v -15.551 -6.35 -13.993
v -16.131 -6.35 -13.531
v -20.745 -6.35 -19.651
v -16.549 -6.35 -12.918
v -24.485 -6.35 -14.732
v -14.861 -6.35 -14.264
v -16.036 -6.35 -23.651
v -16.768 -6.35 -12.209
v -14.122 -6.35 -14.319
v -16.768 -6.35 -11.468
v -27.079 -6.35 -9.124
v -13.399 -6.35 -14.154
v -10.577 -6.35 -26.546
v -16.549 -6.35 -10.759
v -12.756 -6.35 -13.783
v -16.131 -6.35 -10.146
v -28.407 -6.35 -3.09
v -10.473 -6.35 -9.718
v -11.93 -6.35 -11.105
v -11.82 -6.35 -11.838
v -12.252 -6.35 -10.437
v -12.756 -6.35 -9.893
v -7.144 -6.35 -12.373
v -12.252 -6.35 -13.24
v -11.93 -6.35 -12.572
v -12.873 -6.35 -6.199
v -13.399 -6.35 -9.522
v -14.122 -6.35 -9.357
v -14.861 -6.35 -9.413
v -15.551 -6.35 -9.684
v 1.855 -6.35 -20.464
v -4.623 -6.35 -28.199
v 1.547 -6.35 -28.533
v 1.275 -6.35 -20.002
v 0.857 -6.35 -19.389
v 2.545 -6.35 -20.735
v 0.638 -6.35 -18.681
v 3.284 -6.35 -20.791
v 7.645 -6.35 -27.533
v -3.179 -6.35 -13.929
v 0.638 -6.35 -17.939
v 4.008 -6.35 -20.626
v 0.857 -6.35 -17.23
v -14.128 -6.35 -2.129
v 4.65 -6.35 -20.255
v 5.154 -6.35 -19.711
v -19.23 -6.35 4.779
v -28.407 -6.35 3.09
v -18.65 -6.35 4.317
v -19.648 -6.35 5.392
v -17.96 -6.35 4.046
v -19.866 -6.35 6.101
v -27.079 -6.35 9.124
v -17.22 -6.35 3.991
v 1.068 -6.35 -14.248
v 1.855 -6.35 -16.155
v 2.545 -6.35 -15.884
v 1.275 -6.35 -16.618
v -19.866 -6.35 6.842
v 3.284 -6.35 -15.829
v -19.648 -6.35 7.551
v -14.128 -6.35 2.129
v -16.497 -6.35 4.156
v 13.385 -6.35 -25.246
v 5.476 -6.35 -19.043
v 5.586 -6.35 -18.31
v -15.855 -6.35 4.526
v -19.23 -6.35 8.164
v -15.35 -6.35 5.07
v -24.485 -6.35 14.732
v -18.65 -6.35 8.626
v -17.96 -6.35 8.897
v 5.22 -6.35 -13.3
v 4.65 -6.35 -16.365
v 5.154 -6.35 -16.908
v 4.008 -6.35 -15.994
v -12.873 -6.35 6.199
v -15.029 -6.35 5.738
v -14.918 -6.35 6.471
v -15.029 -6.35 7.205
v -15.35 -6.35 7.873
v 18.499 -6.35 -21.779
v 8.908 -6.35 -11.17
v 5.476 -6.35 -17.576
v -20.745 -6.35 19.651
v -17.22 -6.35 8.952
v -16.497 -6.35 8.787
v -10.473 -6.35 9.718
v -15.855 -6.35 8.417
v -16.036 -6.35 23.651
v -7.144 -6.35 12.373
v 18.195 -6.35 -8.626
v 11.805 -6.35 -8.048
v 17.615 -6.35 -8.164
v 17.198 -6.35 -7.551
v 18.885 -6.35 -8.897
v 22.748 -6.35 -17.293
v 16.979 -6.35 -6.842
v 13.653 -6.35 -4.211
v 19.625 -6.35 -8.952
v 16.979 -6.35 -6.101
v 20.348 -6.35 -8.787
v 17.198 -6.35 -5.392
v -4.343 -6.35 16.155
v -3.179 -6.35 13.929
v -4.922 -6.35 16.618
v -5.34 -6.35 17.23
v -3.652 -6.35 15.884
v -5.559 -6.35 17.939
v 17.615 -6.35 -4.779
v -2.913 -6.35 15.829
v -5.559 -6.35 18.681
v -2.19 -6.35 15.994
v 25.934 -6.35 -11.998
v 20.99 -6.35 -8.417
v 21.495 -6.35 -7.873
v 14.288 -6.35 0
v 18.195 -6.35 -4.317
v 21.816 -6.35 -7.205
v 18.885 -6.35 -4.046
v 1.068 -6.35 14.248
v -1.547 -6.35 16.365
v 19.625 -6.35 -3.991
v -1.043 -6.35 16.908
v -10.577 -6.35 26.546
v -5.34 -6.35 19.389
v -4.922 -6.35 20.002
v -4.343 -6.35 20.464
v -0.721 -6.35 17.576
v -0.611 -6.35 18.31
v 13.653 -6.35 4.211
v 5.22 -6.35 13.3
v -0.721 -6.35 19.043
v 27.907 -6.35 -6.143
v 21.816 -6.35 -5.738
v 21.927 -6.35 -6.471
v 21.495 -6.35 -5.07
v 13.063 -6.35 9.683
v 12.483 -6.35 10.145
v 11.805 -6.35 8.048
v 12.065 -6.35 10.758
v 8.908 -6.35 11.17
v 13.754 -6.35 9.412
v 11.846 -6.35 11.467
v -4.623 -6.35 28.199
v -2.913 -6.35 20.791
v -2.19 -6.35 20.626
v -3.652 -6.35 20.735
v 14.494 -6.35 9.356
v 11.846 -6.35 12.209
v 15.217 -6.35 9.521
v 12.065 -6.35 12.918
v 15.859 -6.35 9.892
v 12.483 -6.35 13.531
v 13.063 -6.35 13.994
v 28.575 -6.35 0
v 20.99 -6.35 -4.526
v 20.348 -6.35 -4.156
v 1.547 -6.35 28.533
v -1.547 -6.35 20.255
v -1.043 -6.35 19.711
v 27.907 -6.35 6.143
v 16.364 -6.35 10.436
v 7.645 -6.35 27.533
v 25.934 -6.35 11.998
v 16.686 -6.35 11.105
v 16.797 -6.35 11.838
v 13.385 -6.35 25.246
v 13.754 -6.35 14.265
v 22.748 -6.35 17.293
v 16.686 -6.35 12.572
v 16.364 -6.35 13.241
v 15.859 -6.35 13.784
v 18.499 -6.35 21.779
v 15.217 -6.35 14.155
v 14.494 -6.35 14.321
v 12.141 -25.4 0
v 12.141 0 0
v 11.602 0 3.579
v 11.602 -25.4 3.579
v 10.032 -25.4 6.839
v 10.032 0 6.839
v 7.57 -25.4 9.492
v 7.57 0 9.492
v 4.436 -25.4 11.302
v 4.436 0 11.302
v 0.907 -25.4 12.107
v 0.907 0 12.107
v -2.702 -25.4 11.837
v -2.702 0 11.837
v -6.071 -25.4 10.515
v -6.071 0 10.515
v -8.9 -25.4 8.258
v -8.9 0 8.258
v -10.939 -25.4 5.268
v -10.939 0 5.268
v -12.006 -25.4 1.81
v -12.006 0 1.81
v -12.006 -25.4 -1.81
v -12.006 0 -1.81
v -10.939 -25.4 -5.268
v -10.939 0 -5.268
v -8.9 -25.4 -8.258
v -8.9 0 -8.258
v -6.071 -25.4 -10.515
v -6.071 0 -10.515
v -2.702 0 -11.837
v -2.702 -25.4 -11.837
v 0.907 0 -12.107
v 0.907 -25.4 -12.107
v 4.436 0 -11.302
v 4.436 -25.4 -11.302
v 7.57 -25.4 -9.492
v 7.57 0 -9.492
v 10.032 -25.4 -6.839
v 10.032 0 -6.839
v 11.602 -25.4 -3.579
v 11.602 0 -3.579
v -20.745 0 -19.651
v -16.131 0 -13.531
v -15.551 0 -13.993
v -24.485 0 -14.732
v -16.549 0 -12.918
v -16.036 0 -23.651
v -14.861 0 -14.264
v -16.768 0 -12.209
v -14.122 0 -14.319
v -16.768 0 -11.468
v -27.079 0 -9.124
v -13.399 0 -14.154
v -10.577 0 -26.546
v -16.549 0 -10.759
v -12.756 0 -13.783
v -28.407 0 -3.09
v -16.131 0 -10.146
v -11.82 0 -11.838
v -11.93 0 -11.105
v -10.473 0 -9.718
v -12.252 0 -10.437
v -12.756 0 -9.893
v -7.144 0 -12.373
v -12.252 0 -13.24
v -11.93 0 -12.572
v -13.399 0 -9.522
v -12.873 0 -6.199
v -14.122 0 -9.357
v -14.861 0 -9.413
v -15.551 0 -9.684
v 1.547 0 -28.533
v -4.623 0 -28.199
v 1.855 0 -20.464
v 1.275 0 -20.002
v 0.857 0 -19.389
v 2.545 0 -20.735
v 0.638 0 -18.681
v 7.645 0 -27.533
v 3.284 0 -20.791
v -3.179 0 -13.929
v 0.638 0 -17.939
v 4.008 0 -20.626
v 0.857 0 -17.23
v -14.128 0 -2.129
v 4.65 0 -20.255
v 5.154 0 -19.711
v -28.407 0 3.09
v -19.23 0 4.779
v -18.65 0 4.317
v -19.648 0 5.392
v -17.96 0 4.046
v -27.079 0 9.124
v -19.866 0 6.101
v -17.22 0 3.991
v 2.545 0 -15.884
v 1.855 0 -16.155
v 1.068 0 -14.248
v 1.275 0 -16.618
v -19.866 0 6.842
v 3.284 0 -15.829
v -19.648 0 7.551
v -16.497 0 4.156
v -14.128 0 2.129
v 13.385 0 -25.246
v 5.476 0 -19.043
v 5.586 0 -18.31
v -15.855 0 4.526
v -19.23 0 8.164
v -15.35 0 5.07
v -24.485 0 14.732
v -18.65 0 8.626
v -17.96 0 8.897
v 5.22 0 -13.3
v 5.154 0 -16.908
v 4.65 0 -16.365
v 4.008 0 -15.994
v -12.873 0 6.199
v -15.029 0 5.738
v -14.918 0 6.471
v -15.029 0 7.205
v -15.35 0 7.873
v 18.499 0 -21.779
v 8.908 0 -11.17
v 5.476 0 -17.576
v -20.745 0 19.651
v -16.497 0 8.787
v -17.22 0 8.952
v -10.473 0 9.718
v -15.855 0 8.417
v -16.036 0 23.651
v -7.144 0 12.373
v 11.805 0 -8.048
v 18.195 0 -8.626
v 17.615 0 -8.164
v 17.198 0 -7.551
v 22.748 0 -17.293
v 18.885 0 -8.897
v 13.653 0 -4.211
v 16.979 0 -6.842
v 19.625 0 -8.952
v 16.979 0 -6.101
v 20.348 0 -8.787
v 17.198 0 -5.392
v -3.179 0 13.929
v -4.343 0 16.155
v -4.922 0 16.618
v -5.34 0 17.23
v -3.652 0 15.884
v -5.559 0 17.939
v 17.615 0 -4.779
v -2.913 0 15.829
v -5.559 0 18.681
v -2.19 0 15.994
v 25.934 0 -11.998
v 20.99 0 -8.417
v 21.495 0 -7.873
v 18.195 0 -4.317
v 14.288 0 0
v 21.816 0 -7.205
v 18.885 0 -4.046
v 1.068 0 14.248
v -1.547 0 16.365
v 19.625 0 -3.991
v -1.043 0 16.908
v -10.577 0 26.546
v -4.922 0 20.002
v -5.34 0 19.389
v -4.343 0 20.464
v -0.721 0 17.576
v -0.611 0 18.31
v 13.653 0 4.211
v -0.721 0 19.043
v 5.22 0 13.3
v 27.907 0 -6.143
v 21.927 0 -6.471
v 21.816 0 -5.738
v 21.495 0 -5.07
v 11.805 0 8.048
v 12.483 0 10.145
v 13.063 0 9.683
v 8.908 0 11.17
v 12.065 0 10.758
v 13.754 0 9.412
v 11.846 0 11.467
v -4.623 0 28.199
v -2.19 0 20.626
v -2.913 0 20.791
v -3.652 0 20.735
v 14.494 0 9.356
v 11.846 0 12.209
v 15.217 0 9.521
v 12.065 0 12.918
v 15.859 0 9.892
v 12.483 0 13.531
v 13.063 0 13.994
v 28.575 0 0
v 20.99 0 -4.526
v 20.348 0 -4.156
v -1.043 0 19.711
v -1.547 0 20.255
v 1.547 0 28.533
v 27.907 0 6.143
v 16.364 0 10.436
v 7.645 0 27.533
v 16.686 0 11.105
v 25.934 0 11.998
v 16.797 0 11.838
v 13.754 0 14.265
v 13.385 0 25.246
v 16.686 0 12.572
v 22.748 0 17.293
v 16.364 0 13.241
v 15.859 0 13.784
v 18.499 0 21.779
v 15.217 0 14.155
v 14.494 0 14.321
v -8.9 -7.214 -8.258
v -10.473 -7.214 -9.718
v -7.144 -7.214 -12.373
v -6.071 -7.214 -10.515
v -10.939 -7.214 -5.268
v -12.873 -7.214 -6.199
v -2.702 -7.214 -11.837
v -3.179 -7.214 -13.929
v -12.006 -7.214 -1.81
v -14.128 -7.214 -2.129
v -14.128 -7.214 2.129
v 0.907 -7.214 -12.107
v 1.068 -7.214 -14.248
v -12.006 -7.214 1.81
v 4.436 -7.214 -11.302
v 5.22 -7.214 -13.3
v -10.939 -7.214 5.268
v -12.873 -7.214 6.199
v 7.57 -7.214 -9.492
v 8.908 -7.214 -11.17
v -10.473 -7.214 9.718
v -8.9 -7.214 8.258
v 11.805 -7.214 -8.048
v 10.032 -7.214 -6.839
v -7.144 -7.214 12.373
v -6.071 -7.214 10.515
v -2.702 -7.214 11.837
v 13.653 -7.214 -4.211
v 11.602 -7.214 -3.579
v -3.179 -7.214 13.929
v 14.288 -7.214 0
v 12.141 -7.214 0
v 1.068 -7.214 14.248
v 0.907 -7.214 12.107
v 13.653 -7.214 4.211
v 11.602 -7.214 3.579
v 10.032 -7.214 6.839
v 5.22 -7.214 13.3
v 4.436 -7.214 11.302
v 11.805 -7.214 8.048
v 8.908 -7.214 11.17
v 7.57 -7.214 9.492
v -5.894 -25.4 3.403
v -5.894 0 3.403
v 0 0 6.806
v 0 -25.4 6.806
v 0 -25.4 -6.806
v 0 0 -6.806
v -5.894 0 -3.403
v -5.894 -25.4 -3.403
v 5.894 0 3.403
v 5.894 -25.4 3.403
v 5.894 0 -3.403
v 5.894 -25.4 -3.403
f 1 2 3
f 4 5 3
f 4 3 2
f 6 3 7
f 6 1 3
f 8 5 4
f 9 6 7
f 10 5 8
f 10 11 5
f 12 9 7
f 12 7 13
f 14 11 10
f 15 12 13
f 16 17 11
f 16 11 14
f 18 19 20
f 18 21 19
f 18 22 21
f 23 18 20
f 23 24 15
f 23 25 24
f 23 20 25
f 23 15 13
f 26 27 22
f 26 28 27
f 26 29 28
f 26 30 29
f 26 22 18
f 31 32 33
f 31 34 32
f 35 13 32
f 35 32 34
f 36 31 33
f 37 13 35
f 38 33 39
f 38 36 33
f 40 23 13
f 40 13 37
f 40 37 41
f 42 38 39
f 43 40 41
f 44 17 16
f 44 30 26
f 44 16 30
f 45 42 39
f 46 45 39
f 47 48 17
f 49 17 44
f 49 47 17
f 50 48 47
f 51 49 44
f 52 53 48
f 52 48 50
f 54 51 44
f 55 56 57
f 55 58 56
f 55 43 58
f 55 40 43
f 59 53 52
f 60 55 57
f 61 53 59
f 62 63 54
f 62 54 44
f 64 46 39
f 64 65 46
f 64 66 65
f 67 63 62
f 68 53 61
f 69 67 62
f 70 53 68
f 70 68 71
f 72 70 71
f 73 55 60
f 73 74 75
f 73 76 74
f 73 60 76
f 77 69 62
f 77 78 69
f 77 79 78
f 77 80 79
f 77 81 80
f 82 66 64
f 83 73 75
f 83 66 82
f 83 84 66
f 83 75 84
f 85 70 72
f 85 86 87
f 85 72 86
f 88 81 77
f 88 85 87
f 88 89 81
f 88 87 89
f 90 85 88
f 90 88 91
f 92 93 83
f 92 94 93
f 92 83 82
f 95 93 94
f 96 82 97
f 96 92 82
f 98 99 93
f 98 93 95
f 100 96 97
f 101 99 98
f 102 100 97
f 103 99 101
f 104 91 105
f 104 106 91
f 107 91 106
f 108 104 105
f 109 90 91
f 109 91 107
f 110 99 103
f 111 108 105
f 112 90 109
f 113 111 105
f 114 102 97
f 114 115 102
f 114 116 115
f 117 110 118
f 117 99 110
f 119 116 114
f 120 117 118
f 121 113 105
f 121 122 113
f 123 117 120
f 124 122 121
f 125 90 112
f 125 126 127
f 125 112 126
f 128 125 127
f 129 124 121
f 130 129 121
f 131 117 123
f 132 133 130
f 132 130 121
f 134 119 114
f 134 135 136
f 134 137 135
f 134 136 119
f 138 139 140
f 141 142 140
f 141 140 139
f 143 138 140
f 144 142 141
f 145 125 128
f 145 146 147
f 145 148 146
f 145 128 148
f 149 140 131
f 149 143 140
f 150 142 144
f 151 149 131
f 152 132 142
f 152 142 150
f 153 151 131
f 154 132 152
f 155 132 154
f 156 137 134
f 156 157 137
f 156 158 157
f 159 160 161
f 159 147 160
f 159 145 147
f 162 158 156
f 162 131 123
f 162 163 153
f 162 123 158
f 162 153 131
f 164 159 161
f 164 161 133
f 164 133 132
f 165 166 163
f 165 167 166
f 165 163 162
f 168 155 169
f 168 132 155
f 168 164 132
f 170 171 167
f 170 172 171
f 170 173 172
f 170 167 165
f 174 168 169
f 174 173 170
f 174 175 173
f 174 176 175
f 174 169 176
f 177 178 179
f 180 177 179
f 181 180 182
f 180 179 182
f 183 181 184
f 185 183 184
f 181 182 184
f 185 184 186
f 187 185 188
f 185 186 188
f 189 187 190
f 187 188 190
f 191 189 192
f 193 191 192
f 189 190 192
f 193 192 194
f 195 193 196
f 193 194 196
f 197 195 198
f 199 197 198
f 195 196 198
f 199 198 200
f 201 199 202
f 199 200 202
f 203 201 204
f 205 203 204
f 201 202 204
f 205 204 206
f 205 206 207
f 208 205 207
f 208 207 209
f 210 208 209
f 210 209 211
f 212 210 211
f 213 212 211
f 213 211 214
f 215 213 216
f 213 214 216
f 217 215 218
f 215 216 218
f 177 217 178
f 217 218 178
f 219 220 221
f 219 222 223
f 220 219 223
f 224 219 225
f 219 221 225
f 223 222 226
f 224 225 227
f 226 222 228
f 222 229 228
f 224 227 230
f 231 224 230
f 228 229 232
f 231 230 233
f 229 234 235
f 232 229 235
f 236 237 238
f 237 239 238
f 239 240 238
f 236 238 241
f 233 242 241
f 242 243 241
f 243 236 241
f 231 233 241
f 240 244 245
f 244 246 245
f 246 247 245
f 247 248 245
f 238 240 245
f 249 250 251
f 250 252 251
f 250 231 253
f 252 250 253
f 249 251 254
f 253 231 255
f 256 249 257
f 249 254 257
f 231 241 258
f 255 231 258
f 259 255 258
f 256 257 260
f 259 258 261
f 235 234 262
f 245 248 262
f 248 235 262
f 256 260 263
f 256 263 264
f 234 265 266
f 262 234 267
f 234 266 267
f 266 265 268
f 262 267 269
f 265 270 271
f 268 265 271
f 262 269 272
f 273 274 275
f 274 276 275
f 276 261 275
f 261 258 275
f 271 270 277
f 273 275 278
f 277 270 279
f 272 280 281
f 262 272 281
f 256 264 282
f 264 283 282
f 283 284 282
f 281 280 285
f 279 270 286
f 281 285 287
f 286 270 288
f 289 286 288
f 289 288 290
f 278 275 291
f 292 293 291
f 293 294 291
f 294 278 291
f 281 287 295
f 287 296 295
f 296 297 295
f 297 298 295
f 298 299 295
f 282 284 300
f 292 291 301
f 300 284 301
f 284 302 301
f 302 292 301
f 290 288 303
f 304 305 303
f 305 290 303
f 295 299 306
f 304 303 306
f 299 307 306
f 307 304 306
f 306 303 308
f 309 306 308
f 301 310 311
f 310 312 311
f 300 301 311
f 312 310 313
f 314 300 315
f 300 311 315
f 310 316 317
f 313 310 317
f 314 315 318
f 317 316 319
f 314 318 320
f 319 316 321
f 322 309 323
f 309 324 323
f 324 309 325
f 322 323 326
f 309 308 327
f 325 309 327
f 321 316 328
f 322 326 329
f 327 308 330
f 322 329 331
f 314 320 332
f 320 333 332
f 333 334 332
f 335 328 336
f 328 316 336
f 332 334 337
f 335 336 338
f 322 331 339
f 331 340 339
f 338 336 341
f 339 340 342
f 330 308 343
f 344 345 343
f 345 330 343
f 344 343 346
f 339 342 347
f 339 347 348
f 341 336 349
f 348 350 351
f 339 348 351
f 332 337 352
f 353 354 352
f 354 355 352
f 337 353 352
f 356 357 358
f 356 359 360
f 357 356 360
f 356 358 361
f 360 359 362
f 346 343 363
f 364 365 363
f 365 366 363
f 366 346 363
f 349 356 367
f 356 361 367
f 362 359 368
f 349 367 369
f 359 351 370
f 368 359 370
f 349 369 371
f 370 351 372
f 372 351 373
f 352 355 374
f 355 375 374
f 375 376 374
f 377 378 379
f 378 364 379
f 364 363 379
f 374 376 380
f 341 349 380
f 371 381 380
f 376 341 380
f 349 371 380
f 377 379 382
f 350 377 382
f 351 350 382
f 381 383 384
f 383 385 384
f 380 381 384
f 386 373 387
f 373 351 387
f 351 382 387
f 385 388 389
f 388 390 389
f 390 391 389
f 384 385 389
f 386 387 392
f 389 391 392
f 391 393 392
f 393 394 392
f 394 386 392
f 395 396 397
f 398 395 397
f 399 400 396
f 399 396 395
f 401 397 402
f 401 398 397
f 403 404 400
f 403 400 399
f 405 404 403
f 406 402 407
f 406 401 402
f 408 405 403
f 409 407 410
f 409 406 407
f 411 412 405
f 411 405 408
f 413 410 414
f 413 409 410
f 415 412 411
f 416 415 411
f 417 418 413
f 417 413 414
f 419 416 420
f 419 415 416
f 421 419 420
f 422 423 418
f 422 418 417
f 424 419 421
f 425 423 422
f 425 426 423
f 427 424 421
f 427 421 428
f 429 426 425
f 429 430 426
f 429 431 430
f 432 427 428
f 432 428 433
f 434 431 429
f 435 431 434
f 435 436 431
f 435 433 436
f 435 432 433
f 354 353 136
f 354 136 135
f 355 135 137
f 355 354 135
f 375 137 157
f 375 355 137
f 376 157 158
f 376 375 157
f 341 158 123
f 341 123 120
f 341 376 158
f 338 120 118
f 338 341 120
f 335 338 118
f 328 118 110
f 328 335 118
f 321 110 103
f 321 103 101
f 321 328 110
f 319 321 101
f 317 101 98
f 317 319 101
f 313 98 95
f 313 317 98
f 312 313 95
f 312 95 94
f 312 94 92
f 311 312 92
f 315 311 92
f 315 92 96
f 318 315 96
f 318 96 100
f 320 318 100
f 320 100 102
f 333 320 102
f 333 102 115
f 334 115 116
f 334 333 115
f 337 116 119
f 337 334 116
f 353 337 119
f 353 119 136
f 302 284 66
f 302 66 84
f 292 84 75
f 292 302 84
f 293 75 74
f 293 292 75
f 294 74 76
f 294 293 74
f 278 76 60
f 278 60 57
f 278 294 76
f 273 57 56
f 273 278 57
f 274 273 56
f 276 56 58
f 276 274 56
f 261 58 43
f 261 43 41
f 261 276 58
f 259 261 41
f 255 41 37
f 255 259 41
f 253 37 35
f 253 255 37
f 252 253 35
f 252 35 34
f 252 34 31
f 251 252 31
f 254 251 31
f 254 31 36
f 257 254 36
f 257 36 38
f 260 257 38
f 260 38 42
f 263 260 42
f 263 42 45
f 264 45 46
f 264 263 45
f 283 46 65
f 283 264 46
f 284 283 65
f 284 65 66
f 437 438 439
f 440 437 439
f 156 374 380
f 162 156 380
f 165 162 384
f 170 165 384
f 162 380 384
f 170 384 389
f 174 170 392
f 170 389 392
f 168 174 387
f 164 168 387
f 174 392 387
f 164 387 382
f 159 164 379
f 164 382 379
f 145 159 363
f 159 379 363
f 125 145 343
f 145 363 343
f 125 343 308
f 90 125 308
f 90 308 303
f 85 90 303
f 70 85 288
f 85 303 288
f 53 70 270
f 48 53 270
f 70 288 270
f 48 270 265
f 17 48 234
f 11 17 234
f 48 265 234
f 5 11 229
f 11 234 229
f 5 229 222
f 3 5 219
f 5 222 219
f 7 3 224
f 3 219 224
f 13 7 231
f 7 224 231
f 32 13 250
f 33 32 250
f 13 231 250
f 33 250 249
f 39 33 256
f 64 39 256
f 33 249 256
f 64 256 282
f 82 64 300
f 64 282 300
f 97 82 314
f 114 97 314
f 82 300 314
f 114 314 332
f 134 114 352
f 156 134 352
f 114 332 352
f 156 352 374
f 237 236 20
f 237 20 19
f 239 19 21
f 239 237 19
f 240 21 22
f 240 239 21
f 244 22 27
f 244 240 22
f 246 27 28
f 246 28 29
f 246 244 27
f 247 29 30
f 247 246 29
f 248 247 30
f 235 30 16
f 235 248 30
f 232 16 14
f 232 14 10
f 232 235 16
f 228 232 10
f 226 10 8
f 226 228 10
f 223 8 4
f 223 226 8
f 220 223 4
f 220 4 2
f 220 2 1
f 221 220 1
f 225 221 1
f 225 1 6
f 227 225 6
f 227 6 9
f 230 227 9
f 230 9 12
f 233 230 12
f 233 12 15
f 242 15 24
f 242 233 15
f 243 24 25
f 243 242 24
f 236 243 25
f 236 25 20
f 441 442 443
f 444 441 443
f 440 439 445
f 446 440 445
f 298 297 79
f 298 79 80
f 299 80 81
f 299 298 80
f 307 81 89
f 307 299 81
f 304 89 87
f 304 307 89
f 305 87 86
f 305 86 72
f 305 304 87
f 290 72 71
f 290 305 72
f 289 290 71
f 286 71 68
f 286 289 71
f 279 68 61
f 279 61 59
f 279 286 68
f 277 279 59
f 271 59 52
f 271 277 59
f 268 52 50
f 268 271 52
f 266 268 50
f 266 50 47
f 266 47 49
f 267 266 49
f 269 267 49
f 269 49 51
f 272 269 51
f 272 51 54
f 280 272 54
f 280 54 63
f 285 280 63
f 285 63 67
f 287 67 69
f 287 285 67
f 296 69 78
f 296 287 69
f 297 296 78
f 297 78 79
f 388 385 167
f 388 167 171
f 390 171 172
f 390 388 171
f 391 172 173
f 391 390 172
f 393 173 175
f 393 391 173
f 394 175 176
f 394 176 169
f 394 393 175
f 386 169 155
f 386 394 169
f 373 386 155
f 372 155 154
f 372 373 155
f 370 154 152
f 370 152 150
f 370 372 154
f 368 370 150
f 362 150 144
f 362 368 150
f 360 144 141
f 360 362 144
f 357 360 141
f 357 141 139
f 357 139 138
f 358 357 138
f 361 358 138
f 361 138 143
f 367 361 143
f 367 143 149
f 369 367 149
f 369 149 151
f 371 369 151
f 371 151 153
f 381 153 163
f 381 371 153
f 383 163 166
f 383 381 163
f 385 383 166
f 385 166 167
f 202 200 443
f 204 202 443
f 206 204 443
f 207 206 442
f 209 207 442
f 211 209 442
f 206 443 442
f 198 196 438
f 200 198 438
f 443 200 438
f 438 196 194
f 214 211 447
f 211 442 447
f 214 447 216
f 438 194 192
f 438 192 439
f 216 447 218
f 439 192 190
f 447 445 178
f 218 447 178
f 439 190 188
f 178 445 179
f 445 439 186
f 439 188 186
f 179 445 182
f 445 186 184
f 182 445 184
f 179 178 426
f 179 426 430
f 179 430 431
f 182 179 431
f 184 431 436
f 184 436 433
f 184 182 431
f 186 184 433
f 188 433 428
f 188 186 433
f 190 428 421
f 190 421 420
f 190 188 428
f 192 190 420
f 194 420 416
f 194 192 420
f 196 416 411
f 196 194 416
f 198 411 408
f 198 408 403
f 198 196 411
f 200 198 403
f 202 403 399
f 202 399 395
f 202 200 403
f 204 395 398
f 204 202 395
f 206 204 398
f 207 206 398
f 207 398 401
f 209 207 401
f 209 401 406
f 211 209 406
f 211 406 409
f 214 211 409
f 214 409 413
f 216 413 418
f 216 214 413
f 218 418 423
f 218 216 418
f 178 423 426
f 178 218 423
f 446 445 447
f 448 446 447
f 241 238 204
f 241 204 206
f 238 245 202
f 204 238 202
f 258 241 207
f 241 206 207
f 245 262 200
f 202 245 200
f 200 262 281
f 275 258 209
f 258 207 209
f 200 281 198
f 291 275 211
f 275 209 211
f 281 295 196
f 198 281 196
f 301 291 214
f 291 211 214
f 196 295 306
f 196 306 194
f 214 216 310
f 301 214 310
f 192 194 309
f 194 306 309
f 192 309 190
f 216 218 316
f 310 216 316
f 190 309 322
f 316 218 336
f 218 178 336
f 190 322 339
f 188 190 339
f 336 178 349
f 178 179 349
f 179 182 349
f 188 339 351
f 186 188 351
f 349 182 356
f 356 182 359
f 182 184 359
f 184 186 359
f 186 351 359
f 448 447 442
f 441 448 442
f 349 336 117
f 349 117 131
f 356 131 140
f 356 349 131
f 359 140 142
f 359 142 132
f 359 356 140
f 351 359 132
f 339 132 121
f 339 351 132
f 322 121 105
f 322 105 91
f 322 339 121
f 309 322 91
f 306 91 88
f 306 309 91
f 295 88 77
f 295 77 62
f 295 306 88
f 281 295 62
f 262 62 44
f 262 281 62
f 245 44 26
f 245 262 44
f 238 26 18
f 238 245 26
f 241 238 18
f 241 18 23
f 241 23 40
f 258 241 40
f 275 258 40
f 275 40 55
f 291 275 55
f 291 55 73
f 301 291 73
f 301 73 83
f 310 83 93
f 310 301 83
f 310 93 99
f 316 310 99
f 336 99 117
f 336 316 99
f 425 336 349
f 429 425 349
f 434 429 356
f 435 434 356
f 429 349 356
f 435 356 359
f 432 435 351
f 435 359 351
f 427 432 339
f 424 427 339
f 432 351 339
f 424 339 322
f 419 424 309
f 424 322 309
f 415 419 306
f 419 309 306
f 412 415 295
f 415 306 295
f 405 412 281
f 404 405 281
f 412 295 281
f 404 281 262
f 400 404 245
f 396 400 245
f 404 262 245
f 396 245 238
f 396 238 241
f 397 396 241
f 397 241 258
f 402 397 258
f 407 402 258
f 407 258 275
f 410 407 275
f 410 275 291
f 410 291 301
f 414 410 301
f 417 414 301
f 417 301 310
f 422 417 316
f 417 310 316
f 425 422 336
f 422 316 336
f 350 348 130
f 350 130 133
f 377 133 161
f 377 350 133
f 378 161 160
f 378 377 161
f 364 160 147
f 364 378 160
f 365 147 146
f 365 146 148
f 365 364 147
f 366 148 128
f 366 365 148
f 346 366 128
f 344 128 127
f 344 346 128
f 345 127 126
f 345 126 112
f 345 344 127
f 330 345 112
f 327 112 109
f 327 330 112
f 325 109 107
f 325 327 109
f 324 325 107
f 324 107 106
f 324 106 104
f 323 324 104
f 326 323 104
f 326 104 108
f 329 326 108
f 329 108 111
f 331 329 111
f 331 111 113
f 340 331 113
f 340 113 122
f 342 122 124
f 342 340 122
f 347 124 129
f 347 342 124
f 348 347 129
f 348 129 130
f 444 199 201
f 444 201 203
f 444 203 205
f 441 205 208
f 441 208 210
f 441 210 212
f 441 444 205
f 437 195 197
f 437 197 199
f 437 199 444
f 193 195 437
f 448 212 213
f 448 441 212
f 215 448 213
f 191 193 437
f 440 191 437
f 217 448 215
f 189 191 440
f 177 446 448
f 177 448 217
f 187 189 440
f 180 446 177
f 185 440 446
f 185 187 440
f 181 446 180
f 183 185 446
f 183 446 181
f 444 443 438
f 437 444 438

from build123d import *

# Parameters (mm, degrees)
F0_R     = 12.1412
F1_DEPTH = 25.4
F0_R_2   = 28.575
F0_R_3   = 2.48793
F0_R_4   = 14.2875
F0_R_5   = 2.4892
F2_DEPTH = 6.35
F3_DEPTH = 7.2136


with BuildPart() as f1:
    # F0 (on Front) → F1 (new body)
    with BuildSketch(Plane.XZ):
        Circle(F0_R)
        Polygon((0, 6.805909), (5.894091, 3.402955), (5.894091, -3.402955), (0, -6.805909), (-5.894091, -3.402955), (-5.894091, 3.402955), align=None, mode=Mode.SUBTRACT)
    extrude(amount=F1_DEPTH)


with BuildPart() as f2:
    # F0 (on Front) → F2 (new body)
    with BuildSketch(Plane.XZ):
        Circle(F0_R_2)
        with Locations((-14.307495, -11.838349)):
            Circle(F0_R_3, mode=Mode.SUBTRACT)
        with Locations((3.098563, -18.309829)):
            Circle(F0_R_3, mode=Mode.SUBTRACT)
        with Locations((19.439049, -6.47148)):
            Circle(F0_R_3, mode=Mode.SUBTRACT)
        with Locations((-17.406059, 6.47148)):
            Circle(F0_R_3, mode=Mode.SUBTRACT)
        with Locations((-3.098563, 18.309829)):
            Circle(F0_R_3, mode=Mode.SUBTRACT)
        Circle(F0_R_4, mode=Mode.SUBTRACT)
        with Locations((14.307495, 11.838349)):
            Circle(F0_R_5, mode=Mode.SUBTRACT)
    extrude(amount=F2_DEPTH)


with BuildPart() as f3:
    # F0 (on Front) → F3 (new body)
    with BuildSketch(Plane.XZ):
        Circle(F0_R_4)
        Circle(F0_R, mode=Mode.SUBTRACT)
    extrude(amount=F3_DEPTH)


solid = Compound([f1.part, f2.part, f3.part])
